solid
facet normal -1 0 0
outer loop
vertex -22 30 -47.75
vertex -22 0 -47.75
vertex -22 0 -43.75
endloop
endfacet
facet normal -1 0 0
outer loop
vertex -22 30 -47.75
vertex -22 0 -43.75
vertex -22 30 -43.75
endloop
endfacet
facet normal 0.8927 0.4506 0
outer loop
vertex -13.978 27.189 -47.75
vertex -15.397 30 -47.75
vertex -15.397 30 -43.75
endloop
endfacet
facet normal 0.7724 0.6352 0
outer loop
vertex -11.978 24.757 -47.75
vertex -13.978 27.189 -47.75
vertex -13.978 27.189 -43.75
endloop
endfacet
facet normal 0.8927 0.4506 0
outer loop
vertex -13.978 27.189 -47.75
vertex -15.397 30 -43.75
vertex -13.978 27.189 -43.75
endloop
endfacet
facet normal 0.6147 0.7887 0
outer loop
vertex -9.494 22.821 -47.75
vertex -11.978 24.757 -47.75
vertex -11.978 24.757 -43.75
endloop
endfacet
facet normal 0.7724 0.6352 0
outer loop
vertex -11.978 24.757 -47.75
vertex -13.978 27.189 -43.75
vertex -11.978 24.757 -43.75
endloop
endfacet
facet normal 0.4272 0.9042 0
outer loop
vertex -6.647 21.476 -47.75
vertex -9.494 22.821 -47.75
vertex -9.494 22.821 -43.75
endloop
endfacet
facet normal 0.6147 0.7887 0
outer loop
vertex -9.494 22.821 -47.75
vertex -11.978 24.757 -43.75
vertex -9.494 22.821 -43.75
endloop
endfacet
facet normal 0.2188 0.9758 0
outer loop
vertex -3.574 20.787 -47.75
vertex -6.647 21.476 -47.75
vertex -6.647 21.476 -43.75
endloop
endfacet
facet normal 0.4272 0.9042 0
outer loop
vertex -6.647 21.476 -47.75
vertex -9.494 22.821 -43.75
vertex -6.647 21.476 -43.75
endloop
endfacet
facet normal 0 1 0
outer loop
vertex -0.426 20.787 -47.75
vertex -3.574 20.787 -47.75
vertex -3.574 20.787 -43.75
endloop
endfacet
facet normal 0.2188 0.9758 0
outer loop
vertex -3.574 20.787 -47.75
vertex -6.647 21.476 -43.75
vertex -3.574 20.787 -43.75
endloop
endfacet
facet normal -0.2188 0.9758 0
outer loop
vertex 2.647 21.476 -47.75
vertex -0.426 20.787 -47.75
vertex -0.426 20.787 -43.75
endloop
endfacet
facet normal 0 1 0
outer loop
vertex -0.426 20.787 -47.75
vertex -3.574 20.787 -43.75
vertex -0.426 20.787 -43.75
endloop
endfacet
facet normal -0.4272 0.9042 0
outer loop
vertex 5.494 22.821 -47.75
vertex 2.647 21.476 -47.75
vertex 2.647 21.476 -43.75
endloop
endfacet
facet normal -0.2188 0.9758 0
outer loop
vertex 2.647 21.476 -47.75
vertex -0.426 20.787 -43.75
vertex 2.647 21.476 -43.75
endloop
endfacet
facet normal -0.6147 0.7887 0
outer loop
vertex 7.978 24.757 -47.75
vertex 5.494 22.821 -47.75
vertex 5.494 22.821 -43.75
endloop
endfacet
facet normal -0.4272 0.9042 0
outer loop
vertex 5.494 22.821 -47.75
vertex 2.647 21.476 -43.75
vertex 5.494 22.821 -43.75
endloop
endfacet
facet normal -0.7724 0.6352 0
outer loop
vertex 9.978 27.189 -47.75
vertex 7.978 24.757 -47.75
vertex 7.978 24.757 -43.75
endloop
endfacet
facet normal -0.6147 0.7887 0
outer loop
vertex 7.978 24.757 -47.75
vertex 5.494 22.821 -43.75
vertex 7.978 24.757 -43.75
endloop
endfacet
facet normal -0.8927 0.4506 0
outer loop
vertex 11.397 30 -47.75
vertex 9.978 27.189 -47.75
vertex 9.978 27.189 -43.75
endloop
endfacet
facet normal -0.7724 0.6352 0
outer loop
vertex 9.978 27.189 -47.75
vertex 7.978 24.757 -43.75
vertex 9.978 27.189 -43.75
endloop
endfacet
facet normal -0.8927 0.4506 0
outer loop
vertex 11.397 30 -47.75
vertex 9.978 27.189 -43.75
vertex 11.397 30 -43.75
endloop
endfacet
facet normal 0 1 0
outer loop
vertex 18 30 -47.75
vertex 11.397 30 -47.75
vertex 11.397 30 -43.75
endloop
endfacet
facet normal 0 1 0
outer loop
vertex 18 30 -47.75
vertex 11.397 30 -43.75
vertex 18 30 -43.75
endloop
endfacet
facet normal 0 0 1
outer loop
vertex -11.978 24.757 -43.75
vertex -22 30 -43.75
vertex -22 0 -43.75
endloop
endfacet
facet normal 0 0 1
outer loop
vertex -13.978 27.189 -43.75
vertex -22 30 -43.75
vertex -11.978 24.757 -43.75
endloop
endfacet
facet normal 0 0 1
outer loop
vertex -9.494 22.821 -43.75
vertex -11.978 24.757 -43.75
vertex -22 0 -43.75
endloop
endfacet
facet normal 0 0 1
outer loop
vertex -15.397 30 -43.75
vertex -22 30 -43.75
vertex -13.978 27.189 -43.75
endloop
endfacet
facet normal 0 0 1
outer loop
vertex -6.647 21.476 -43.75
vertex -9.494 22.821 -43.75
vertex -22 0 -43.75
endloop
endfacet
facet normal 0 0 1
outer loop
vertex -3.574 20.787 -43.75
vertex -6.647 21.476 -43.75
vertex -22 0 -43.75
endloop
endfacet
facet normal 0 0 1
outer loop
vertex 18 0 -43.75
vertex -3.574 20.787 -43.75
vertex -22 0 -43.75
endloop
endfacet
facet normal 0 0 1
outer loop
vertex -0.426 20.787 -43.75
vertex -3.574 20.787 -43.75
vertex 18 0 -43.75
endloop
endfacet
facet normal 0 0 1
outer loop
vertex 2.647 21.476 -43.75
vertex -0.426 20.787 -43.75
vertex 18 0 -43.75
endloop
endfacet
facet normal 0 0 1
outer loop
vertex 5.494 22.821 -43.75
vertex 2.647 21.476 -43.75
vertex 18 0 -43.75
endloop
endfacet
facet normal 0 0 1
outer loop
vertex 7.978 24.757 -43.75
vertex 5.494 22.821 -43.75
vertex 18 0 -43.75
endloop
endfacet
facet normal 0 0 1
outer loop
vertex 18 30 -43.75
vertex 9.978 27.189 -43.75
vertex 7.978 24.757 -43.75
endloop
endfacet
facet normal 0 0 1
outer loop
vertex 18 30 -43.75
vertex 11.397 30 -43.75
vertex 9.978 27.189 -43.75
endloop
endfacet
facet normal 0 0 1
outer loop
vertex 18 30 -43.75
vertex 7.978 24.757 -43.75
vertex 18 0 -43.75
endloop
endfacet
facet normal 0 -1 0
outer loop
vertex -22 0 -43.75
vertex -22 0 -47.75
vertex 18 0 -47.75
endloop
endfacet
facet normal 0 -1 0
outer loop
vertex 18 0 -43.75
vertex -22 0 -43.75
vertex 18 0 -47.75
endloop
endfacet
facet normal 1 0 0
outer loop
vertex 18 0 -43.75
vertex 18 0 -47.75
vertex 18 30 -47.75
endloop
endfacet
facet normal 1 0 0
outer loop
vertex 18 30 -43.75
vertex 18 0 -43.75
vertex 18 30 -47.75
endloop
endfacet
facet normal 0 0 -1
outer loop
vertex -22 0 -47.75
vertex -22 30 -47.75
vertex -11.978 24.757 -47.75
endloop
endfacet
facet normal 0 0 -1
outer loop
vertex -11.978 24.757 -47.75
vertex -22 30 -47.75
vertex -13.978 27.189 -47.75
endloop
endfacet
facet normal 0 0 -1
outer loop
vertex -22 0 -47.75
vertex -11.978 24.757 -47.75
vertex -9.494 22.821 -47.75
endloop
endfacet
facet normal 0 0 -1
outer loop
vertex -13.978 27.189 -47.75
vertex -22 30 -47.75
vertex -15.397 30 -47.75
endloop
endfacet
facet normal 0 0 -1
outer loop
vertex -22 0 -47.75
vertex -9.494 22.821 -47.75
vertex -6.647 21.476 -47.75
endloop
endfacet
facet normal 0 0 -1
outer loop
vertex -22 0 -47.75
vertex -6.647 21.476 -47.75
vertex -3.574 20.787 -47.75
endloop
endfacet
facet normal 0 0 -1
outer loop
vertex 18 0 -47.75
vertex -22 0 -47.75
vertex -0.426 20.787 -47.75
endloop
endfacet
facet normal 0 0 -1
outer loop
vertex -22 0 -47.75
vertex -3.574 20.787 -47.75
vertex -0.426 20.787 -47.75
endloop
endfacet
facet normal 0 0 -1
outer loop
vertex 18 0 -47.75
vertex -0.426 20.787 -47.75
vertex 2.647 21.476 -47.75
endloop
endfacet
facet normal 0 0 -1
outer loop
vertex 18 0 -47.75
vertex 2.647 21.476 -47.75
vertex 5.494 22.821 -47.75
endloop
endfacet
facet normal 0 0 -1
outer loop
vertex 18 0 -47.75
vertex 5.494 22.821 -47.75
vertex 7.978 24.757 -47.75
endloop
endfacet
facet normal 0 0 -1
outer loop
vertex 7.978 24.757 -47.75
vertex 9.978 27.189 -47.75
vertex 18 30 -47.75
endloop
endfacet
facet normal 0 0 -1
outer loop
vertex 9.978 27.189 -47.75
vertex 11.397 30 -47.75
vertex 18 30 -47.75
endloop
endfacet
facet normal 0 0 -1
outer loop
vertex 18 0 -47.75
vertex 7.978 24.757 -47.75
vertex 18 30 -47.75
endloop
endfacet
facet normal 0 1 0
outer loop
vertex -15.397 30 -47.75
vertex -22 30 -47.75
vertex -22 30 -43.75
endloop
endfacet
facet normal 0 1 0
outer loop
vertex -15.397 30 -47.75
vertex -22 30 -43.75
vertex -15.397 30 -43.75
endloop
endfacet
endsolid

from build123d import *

# Parameters (mm, degrees)
SKETCH1_W           = 40
SKETCH1_H           = 30
BOSS_EXTRUDE1_DEPTH = 4
CUT_EXTRUDE3_REACH  = 39.417
SKETCH5_R           = 14.3


with BuildPart() as part:
    # Sketch1 → Boss-Extrude1 (new body)
    with BuildSketch(Plane.XY.offset(-47.75)):
        with Locations((-2, 15)):
            Rectangle(SKETCH1_W, SKETCH1_H)
    extrude(amount=BOSS_EXTRUDE1_DEPTH)

    # Sketch5 → Cut-Extrude3 (cut, up to next)
    with BuildSketch(Plane.XY.offset(-43.75), mode=Mode.PRIVATE) as cut_extrude3_sk1:
        with Locations((-2, 35)):
            Circle(SKETCH5_R)
    cut_extrude3_tool1 = extrude(cut_extrude3_sk1.sketch, amount=-CUT_EXTRUDE3_REACH, mode=Mode.PRIVATE) & part.part
    add(cut_extrude3_tool1.solids().sort_by_distance((-2, 35, -43.75))[0], mode=Mode.SUBTRACT)


solid = part.part
